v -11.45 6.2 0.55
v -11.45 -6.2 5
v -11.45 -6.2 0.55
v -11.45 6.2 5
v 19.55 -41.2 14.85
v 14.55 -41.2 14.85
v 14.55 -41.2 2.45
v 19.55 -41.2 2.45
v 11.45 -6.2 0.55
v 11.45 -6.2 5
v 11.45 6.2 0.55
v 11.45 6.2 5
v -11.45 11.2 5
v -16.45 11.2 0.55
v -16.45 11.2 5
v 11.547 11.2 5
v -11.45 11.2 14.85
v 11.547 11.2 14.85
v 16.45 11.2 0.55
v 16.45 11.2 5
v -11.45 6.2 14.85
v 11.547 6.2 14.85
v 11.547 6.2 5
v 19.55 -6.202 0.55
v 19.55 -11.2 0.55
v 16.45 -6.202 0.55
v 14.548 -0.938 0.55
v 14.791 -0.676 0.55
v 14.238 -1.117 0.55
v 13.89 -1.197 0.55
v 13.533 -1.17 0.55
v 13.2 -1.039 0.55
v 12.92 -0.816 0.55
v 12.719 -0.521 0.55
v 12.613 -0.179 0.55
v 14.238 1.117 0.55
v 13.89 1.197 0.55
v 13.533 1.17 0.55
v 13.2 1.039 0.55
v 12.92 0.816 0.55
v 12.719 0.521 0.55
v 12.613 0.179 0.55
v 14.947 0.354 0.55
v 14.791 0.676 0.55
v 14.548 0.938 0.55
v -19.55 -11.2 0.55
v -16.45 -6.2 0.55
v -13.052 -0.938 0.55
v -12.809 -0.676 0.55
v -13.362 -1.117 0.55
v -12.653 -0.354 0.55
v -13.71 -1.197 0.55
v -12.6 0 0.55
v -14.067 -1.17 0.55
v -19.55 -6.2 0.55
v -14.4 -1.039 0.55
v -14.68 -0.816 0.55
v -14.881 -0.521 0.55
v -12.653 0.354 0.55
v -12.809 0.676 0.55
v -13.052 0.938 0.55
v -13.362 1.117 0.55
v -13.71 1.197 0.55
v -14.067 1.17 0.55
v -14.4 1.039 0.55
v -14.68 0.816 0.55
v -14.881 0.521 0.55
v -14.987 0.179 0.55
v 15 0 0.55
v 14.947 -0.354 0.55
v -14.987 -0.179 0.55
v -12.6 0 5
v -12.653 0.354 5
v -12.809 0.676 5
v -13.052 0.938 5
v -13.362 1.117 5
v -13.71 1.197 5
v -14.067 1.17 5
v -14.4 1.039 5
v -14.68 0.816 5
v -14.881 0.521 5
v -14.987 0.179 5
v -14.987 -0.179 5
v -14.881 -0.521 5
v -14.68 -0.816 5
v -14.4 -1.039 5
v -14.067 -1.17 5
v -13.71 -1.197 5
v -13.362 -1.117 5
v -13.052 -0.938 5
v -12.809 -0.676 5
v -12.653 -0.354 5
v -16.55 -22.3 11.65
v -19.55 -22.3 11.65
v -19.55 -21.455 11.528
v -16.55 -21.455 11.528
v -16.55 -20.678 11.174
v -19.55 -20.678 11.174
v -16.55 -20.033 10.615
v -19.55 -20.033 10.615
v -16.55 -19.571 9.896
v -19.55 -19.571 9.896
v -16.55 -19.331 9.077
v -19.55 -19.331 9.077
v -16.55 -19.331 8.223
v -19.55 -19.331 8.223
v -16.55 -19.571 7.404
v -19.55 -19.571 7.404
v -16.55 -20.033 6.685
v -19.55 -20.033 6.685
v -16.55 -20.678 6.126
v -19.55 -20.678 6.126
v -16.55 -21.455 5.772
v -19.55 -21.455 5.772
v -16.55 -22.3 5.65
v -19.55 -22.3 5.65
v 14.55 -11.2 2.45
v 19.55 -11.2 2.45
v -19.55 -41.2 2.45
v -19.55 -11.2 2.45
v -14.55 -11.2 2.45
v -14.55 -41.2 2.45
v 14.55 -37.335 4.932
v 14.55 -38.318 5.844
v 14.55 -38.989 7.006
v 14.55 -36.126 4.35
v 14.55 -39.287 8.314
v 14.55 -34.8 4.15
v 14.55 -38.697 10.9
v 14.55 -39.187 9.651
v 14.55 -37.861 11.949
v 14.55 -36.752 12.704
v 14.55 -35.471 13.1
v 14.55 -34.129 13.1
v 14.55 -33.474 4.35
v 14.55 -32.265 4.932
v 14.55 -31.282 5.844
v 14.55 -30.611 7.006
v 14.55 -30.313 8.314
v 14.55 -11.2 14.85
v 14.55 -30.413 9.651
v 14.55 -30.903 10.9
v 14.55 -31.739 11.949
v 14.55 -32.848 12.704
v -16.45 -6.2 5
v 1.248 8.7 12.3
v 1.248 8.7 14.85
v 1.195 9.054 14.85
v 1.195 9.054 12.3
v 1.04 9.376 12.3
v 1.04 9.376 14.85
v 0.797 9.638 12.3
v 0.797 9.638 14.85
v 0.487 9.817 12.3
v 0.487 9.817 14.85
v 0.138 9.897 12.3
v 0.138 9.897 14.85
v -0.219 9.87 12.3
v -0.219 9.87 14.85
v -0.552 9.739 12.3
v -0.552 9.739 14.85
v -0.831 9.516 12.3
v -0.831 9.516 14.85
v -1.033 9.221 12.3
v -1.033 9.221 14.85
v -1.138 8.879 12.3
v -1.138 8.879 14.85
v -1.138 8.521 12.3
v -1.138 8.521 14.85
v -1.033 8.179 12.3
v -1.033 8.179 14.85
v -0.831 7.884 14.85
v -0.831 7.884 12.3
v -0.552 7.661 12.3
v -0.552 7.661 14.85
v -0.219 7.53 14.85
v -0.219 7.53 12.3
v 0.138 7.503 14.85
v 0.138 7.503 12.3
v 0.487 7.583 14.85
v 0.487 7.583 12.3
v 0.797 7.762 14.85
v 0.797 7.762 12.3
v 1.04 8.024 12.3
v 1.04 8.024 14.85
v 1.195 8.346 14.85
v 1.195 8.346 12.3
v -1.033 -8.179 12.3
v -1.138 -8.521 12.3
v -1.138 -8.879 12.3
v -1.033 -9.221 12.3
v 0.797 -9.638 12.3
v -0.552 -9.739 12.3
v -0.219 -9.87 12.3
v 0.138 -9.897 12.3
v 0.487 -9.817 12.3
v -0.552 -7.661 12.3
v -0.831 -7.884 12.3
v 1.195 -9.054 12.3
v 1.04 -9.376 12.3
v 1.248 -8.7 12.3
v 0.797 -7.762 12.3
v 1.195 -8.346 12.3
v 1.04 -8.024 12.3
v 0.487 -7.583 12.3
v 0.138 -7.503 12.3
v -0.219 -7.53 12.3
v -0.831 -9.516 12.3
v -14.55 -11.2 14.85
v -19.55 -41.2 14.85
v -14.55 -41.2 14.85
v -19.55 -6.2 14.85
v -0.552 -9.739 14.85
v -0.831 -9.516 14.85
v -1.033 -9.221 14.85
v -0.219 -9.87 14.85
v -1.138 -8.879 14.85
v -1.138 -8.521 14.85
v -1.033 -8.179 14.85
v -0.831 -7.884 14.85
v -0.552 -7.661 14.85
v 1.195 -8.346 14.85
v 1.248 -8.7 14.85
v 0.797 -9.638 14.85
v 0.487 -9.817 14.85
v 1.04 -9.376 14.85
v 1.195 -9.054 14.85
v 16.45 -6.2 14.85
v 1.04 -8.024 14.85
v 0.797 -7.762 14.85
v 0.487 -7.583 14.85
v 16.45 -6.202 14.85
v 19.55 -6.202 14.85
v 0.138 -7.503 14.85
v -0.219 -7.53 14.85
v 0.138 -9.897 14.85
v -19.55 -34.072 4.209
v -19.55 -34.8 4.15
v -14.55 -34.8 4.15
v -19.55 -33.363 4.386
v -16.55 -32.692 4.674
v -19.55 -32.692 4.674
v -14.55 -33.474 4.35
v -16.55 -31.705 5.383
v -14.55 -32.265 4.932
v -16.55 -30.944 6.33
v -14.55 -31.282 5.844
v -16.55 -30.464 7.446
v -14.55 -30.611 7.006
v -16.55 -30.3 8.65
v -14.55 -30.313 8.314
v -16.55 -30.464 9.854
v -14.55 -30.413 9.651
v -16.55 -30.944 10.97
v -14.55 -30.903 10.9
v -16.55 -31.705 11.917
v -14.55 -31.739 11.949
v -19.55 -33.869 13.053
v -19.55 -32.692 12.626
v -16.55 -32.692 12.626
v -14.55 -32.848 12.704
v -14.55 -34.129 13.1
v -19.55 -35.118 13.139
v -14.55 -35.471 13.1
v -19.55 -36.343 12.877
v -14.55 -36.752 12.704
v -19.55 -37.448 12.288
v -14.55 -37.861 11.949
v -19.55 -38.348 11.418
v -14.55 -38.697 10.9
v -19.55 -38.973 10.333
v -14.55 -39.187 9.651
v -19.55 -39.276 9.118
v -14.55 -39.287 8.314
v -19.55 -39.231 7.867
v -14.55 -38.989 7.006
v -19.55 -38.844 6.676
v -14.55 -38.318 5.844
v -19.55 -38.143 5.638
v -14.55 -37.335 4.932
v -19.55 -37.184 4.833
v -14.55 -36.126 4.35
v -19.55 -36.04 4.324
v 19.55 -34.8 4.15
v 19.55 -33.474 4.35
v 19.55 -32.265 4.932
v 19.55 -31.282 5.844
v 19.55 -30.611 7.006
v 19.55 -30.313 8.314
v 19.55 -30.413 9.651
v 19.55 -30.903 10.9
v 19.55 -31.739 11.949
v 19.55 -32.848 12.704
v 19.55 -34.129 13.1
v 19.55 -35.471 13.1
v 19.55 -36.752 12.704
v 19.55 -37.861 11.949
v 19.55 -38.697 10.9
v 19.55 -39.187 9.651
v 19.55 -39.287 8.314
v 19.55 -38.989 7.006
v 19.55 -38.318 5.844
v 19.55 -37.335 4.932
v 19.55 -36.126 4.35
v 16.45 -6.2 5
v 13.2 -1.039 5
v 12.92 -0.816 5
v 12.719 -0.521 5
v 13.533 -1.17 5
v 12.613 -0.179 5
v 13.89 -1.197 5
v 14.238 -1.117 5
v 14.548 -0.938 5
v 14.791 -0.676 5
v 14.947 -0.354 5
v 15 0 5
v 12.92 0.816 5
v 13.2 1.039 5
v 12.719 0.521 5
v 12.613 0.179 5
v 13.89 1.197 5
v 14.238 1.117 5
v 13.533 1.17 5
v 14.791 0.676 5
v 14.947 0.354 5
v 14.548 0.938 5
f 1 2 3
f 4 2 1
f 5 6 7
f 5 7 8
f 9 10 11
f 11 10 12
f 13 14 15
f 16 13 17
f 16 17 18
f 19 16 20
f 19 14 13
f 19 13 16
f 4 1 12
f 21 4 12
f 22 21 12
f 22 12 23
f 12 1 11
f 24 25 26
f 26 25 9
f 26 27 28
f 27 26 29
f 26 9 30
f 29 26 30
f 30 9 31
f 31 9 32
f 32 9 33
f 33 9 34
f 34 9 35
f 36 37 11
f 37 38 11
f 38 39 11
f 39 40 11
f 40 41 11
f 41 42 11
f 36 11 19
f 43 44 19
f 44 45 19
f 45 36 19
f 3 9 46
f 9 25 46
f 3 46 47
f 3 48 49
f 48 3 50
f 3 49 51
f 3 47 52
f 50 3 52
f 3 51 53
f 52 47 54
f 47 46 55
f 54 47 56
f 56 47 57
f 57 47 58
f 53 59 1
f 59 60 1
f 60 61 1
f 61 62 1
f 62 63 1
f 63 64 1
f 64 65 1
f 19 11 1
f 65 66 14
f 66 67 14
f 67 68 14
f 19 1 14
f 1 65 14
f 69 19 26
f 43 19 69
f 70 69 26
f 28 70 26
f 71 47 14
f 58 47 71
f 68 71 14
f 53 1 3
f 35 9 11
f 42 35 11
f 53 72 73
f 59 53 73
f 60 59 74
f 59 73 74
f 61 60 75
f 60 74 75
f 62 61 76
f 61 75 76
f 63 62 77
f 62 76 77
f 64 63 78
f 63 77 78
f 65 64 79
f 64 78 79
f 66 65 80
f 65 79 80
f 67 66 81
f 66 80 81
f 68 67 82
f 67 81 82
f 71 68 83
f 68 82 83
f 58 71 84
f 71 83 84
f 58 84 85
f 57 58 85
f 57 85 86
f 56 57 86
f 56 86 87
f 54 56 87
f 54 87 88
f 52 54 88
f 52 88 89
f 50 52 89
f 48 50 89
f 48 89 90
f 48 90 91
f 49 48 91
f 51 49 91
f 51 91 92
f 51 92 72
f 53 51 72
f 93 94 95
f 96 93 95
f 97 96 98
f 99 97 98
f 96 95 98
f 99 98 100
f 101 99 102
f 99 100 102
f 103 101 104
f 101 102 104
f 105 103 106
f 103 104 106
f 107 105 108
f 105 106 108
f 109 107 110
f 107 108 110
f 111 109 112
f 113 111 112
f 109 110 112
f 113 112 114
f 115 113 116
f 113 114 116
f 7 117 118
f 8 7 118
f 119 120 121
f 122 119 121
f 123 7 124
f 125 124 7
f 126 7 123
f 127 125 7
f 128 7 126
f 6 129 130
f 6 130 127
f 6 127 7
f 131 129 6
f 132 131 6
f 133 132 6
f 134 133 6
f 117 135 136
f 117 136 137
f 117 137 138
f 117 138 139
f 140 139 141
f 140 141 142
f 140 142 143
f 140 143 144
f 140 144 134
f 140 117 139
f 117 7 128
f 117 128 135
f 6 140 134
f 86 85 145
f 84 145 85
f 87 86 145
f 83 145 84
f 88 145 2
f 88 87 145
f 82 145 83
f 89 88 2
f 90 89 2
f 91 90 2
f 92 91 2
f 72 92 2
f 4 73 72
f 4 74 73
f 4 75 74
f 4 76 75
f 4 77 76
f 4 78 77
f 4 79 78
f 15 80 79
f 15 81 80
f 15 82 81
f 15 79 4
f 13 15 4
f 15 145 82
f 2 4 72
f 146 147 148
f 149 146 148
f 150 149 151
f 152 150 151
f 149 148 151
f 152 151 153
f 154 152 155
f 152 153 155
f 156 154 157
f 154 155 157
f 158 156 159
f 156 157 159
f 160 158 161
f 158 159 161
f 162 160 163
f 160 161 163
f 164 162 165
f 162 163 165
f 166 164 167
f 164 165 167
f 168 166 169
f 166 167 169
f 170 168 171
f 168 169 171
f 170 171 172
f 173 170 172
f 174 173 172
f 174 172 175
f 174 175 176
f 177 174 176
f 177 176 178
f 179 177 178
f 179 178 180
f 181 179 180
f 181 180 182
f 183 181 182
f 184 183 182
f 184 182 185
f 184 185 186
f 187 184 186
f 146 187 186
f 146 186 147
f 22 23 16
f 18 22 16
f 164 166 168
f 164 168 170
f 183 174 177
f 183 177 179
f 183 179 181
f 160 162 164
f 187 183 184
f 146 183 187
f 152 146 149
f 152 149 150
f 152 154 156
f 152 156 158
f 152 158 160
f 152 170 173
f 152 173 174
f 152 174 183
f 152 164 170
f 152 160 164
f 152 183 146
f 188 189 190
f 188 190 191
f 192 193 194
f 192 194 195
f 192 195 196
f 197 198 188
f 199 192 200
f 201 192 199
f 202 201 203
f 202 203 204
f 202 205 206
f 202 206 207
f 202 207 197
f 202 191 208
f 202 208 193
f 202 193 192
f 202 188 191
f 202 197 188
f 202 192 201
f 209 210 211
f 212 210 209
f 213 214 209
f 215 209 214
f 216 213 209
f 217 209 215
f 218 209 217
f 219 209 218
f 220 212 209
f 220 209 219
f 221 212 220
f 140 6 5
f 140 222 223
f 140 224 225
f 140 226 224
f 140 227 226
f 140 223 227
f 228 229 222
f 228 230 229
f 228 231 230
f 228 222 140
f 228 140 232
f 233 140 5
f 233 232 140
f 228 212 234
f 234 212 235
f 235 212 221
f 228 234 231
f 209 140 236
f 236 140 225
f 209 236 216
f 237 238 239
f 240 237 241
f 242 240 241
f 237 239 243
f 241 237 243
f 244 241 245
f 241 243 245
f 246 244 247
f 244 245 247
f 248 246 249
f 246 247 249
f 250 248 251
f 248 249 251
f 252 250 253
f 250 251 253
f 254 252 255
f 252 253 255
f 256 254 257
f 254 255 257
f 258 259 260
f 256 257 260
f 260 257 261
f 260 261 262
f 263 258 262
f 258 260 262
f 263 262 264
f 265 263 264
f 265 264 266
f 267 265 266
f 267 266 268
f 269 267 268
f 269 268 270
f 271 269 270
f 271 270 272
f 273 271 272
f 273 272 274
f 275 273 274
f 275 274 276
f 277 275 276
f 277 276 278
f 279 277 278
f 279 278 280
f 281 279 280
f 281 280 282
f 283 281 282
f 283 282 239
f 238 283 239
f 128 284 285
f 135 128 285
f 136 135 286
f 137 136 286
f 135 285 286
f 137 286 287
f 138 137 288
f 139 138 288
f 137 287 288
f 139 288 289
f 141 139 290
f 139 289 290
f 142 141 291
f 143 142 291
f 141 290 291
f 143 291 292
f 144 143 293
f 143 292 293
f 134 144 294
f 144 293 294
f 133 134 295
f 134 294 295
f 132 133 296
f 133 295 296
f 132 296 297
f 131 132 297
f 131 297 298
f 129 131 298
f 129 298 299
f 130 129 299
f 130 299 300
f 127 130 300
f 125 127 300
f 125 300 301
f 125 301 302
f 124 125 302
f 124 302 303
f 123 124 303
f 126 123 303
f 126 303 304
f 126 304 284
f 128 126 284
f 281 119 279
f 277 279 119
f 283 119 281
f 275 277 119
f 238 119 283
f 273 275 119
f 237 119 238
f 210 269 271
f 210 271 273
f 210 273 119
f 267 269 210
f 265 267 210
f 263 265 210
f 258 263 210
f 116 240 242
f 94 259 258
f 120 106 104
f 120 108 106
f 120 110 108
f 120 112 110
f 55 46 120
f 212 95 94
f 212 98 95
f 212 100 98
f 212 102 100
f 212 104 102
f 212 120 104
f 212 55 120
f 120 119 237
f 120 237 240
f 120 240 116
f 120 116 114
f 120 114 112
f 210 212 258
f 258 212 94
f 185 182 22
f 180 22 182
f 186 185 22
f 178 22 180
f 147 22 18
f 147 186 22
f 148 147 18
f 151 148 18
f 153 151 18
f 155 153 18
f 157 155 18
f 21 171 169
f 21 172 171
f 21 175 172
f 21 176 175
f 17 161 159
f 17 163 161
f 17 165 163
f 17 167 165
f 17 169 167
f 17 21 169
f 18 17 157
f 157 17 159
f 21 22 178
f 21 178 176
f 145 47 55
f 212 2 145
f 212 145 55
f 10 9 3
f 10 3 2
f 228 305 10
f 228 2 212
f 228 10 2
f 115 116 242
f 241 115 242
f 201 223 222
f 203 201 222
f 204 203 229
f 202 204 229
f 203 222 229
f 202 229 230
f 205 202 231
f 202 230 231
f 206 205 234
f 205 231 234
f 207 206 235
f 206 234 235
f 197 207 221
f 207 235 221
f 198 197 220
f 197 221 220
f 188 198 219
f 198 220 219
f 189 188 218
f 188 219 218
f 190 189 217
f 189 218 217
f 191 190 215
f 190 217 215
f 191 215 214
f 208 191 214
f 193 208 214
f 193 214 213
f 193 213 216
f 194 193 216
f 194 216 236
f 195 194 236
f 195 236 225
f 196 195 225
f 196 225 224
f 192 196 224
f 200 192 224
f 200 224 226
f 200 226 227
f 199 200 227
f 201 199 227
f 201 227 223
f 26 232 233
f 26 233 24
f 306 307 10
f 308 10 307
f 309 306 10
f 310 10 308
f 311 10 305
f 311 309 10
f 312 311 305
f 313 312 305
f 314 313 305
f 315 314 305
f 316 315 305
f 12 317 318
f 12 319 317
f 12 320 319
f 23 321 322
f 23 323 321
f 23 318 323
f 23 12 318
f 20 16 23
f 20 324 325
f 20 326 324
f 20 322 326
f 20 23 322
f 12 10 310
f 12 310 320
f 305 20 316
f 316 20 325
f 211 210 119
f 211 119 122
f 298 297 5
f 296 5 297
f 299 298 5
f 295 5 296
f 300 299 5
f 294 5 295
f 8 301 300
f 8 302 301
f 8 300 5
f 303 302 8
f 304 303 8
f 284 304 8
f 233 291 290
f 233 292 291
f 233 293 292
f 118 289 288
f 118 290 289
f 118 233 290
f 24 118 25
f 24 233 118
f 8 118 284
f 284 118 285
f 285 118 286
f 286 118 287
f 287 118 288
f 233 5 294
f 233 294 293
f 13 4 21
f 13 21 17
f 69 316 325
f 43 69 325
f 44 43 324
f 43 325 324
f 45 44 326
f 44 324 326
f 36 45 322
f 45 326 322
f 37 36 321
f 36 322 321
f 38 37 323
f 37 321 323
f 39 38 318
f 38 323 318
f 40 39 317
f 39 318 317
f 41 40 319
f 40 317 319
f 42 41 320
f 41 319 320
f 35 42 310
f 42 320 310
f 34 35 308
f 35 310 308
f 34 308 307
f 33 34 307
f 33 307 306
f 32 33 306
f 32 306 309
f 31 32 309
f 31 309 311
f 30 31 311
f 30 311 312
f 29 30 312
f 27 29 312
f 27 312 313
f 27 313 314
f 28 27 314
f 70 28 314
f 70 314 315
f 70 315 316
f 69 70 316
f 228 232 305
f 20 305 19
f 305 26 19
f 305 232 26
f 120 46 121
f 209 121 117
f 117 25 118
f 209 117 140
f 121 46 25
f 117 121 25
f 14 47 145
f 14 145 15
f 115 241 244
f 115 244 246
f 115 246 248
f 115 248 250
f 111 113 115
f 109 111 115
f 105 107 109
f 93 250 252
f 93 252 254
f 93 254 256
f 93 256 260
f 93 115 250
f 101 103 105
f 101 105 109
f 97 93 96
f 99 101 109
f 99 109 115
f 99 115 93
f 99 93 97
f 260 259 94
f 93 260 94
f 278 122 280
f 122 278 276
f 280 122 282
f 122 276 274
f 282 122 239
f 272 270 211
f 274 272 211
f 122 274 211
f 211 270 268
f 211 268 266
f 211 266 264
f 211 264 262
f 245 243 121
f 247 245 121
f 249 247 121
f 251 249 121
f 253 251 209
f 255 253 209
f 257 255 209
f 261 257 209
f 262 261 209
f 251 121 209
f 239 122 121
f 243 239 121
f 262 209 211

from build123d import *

# Parameters (mm, degrees)
SKETCH1_W           = 32.9
SKETCH1_H           = 22.4
BOSS_EXTRUDE1_DEPTH = 5
SKETCH2_R           = 1.2
SKETCH2_W           = 22.9
SKETCH2_H           = 12.4
CUT_EXTRUDE2_DEPTH  = 5
SKETCH3_W           = 22.996888994
SKETCH3_H           = 5
BOSS_EXTRUDE2_DEPTH = 12.3
SKETCH4_R           = 1.2
CUT_EXTRUDE3_DEPTH  = 5
SKETCH6_W           = 5
SKETCH6_H           = 5
SKETCH6_W_2         = 4.903111006
BOSS_EXTRUDE3_DEPTH = 12.3
SKETCH8_W           = 17.3
SKETCH8_H           = 4.998204887
BOSS_EXTRUDE4_DEPTH = 3.1
SKETCH9_W           = 17.3
SKETCH9_H           = 5
BOSS_EXTRUDE5_DEPTH = 3.1
SKETCH18_W          = 5
SKETCH18_H          = 12.4
BOSS_EXTRUDE7_DEPTH = 30
SKETCH19_R          = 4.5
CUT_EXTRUDE6_DEPTH  = 30
SKETCH20_R          = 4.5
CUT_EXTRUDE7_DEPTH  = 30
SKETCH10_W          = 5
SKETCH10_H          = 12.4
BOSS_EXTRUDE6_DEPTH = 30
SKETCH21_R          = 4.5
CUT_EXTRUDE8_DEPTH  = 10
SKETCH22_R          = 4.5
CUT_EXTRUDE9_DEPTH  = 10
CUT_EXTRUDE10_DEPTH = 3
SKETCH25_W          = 2.45
SKETCH25_H          = 22.4
SKETCH25_W_2        = 0.55
CUT_EXTRUDE11_DEPTH = 40.1


with BuildPart() as part:
    # Sketch1 → Boss-Extrude1 (new body)
    with BuildSketch(Plane.XY):
        Rectangle(SKETCH1_W, SKETCH1_H)
    extrude(amount=BOSS_EXTRUDE1_DEPTH)

    # Sketch2 → Cut-Extrude2 (cut)
    with BuildSketch(Plane.XY.offset(5)):
        with Locations((13.8, 0)):
            Circle(SKETCH2_R)
        with Locations((-13.8, 0)):
            Circle(SKETCH2_R)
        Rectangle(SKETCH2_W, SKETCH2_H)
    extrude(amount=-CUT_EXTRUDE2_DEPTH, mode=Mode.SUBTRACT)

    # Sketch3 → Boss-Extrude2 (add)
    with BuildSketch(Plane.XY.offset(5)):
        with Locations((0.048444497, 8.7)):
            Rectangle(SKETCH3_W, SKETCH3_H)
        with Locations((0.048444497, -8.7)):
            Rectangle(SKETCH3_W, SKETCH3_H)
    extrude(amount=BOSS_EXTRUDE2_DEPTH)

    # Sketch4 → Cut-Extrude3 (cut)
    with BuildSketch(Plane.XY.offset(17.3)):
        with Locations((0.048444497, 8.7)):
            Circle(SKETCH4_R)
        with Locations((0.048444497, -8.7)):
            Circle(SKETCH4_R)
    extrude(amount=-CUT_EXTRUDE3_DEPTH, mode=Mode.SUBTRACT)

    # Sketch6 → Boss-Extrude3 (add)
    with BuildSketch(Plane.XY.offset(5)):
        with Locations((-13.95, -8.7)):
            Rectangle(SKETCH6_W, SKETCH6_H)
        with Locations((13.998444497, -8.7)):
            Rectangle(SKETCH6_W_2, SKETCH6_H)
    extrude(amount=BOSS_EXTRUDE3_DEPTH)

    # Sketch8 → Boss-Extrude4 (add)
    with BuildSketch(Plane(origin=(16.45, 0, 0), x_dir=(0, 0, -1), z_dir=(1, 0, 0))):
        with Locations((-8.65, -8.700897557)):
            Rectangle(SKETCH8_W, SKETCH8_H)
    extrude(amount=BOSS_EXTRUDE4_DEPTH)

    # Sketch9 → Boss-Extrude5 (add)
    with BuildSketch(Plane.ZY.offset(16.45)):
        with Locations((8.65, -8.7)):
            Rectangle(SKETCH9_W, SKETCH9_H)
    extrude(amount=BOSS_EXTRUDE5_DEPTH)

    # Sketch18 → Boss-Extrude7 (add)
    with BuildSketch(Plane.XZ.offset(11.2)):
        with Locations((-17.05, 8.65)):
            Rectangle(SKETCH18_W, SKETCH18_H)
        with Locations((17.05, 8.65)):
            Rectangle(SKETCH18_W, SKETCH18_H)
    extrude(amount=BOSS_EXTRUDE7_DEPTH)

    # Sketch19 → Cut-Extrude6 (cut)
    with BuildSketch(Plane.ZY.offset(19.55)):
        with Locations((8.65, -34.8)):
            Circle(SKETCH19_R)
    extrude(amount=-CUT_EXTRUDE6_DEPTH, mode=Mode.SUBTRACT)

    # Sketch20 → Cut-Extrude7 (cut)
    with BuildSketch(Plane(origin=(19.55, 0, 0), x_dir=(0, 0, -1), z_dir=(1, 0, 0))):
        with Locations((-8.65, -34.8)):
            Circle(SKETCH20_R)
    extrude(amount=-CUT_EXTRUDE7_DEPTH, mode=Mode.SUBTRACT)

    # Sketch10 → Boss-Extrude6 (add)
    with BuildSketch(Plane.XZ.offset(11.2)):
        with Locations((17.05, 8.65)):
            Rectangle(SKETCH10_W, SKETCH10_H)
        with Locations((-17.05, 8.65)):
            Rectangle(SKETCH10_W, SKETCH10_H)
    extrude(amount=BOSS_EXTRUDE6_DEPTH)

    # Sketch21 → Cut-Extrude8 (cut)
    with BuildSketch(Plane(origin=(19.55, 0, 0), x_dir=(0, 0, -1), z_dir=(1, 0, 0))):
        with Locations((-8.65, -34.8)):
            Circle(SKETCH21_R)
    extrude(amount=-CUT_EXTRUDE8_DEPTH, mode=Mode.SUBTRACT)

    # Sketch22 → Cut-Extrude9 (cut)
    with BuildSketch(Plane(origin=(-14.55, 0, 0), x_dir=(0, 0, -1), z_dir=(1, 0, 0))):
        with Locations((-8.65, -34.8)):
            Circle(SKETCH22_R)
    extrude(amount=-CUT_EXTRUDE9_DEPTH, mode=Mode.SUBTRACT)

    # Sketch23 → Cut-Extrude10 (cut)
    with BuildSketch(Plane.ZY.offset(19.55)):
        with BuildLine():
            Line((5.65, -22.3), (4.674239456, -32.692079676))
            ThreePointArc((4.674239456, -32.692079676), (8.65, -30.3), (12.625760544, -32.692079676))
            Line((12.625760544, -32.692079676), (11.65, -22.3))
            ThreePointArc((11.65, -22.3), (8.65, -19.3), (5.65, -22.3))
        make_face()
    extrude(amount=-CUT_EXTRUDE10_DEPTH, mode=Mode.SUBTRACT)

    # Sketch25 → Cut-Extrude11 (cut, through all)
    with BuildSketch(Plane.ZY.offset(19.55)):
        with Locations((16.075, 0)):
            Rectangle(SKETCH25_W, SKETCH25_H)
        with Locations((0.275, 0)):
            Rectangle(SKETCH25_W_2, SKETCH25_H)
    extrude(amount=-CUT_EXTRUDE11_DEPTH, mode=Mode.SUBTRACT)


solid = part.part
